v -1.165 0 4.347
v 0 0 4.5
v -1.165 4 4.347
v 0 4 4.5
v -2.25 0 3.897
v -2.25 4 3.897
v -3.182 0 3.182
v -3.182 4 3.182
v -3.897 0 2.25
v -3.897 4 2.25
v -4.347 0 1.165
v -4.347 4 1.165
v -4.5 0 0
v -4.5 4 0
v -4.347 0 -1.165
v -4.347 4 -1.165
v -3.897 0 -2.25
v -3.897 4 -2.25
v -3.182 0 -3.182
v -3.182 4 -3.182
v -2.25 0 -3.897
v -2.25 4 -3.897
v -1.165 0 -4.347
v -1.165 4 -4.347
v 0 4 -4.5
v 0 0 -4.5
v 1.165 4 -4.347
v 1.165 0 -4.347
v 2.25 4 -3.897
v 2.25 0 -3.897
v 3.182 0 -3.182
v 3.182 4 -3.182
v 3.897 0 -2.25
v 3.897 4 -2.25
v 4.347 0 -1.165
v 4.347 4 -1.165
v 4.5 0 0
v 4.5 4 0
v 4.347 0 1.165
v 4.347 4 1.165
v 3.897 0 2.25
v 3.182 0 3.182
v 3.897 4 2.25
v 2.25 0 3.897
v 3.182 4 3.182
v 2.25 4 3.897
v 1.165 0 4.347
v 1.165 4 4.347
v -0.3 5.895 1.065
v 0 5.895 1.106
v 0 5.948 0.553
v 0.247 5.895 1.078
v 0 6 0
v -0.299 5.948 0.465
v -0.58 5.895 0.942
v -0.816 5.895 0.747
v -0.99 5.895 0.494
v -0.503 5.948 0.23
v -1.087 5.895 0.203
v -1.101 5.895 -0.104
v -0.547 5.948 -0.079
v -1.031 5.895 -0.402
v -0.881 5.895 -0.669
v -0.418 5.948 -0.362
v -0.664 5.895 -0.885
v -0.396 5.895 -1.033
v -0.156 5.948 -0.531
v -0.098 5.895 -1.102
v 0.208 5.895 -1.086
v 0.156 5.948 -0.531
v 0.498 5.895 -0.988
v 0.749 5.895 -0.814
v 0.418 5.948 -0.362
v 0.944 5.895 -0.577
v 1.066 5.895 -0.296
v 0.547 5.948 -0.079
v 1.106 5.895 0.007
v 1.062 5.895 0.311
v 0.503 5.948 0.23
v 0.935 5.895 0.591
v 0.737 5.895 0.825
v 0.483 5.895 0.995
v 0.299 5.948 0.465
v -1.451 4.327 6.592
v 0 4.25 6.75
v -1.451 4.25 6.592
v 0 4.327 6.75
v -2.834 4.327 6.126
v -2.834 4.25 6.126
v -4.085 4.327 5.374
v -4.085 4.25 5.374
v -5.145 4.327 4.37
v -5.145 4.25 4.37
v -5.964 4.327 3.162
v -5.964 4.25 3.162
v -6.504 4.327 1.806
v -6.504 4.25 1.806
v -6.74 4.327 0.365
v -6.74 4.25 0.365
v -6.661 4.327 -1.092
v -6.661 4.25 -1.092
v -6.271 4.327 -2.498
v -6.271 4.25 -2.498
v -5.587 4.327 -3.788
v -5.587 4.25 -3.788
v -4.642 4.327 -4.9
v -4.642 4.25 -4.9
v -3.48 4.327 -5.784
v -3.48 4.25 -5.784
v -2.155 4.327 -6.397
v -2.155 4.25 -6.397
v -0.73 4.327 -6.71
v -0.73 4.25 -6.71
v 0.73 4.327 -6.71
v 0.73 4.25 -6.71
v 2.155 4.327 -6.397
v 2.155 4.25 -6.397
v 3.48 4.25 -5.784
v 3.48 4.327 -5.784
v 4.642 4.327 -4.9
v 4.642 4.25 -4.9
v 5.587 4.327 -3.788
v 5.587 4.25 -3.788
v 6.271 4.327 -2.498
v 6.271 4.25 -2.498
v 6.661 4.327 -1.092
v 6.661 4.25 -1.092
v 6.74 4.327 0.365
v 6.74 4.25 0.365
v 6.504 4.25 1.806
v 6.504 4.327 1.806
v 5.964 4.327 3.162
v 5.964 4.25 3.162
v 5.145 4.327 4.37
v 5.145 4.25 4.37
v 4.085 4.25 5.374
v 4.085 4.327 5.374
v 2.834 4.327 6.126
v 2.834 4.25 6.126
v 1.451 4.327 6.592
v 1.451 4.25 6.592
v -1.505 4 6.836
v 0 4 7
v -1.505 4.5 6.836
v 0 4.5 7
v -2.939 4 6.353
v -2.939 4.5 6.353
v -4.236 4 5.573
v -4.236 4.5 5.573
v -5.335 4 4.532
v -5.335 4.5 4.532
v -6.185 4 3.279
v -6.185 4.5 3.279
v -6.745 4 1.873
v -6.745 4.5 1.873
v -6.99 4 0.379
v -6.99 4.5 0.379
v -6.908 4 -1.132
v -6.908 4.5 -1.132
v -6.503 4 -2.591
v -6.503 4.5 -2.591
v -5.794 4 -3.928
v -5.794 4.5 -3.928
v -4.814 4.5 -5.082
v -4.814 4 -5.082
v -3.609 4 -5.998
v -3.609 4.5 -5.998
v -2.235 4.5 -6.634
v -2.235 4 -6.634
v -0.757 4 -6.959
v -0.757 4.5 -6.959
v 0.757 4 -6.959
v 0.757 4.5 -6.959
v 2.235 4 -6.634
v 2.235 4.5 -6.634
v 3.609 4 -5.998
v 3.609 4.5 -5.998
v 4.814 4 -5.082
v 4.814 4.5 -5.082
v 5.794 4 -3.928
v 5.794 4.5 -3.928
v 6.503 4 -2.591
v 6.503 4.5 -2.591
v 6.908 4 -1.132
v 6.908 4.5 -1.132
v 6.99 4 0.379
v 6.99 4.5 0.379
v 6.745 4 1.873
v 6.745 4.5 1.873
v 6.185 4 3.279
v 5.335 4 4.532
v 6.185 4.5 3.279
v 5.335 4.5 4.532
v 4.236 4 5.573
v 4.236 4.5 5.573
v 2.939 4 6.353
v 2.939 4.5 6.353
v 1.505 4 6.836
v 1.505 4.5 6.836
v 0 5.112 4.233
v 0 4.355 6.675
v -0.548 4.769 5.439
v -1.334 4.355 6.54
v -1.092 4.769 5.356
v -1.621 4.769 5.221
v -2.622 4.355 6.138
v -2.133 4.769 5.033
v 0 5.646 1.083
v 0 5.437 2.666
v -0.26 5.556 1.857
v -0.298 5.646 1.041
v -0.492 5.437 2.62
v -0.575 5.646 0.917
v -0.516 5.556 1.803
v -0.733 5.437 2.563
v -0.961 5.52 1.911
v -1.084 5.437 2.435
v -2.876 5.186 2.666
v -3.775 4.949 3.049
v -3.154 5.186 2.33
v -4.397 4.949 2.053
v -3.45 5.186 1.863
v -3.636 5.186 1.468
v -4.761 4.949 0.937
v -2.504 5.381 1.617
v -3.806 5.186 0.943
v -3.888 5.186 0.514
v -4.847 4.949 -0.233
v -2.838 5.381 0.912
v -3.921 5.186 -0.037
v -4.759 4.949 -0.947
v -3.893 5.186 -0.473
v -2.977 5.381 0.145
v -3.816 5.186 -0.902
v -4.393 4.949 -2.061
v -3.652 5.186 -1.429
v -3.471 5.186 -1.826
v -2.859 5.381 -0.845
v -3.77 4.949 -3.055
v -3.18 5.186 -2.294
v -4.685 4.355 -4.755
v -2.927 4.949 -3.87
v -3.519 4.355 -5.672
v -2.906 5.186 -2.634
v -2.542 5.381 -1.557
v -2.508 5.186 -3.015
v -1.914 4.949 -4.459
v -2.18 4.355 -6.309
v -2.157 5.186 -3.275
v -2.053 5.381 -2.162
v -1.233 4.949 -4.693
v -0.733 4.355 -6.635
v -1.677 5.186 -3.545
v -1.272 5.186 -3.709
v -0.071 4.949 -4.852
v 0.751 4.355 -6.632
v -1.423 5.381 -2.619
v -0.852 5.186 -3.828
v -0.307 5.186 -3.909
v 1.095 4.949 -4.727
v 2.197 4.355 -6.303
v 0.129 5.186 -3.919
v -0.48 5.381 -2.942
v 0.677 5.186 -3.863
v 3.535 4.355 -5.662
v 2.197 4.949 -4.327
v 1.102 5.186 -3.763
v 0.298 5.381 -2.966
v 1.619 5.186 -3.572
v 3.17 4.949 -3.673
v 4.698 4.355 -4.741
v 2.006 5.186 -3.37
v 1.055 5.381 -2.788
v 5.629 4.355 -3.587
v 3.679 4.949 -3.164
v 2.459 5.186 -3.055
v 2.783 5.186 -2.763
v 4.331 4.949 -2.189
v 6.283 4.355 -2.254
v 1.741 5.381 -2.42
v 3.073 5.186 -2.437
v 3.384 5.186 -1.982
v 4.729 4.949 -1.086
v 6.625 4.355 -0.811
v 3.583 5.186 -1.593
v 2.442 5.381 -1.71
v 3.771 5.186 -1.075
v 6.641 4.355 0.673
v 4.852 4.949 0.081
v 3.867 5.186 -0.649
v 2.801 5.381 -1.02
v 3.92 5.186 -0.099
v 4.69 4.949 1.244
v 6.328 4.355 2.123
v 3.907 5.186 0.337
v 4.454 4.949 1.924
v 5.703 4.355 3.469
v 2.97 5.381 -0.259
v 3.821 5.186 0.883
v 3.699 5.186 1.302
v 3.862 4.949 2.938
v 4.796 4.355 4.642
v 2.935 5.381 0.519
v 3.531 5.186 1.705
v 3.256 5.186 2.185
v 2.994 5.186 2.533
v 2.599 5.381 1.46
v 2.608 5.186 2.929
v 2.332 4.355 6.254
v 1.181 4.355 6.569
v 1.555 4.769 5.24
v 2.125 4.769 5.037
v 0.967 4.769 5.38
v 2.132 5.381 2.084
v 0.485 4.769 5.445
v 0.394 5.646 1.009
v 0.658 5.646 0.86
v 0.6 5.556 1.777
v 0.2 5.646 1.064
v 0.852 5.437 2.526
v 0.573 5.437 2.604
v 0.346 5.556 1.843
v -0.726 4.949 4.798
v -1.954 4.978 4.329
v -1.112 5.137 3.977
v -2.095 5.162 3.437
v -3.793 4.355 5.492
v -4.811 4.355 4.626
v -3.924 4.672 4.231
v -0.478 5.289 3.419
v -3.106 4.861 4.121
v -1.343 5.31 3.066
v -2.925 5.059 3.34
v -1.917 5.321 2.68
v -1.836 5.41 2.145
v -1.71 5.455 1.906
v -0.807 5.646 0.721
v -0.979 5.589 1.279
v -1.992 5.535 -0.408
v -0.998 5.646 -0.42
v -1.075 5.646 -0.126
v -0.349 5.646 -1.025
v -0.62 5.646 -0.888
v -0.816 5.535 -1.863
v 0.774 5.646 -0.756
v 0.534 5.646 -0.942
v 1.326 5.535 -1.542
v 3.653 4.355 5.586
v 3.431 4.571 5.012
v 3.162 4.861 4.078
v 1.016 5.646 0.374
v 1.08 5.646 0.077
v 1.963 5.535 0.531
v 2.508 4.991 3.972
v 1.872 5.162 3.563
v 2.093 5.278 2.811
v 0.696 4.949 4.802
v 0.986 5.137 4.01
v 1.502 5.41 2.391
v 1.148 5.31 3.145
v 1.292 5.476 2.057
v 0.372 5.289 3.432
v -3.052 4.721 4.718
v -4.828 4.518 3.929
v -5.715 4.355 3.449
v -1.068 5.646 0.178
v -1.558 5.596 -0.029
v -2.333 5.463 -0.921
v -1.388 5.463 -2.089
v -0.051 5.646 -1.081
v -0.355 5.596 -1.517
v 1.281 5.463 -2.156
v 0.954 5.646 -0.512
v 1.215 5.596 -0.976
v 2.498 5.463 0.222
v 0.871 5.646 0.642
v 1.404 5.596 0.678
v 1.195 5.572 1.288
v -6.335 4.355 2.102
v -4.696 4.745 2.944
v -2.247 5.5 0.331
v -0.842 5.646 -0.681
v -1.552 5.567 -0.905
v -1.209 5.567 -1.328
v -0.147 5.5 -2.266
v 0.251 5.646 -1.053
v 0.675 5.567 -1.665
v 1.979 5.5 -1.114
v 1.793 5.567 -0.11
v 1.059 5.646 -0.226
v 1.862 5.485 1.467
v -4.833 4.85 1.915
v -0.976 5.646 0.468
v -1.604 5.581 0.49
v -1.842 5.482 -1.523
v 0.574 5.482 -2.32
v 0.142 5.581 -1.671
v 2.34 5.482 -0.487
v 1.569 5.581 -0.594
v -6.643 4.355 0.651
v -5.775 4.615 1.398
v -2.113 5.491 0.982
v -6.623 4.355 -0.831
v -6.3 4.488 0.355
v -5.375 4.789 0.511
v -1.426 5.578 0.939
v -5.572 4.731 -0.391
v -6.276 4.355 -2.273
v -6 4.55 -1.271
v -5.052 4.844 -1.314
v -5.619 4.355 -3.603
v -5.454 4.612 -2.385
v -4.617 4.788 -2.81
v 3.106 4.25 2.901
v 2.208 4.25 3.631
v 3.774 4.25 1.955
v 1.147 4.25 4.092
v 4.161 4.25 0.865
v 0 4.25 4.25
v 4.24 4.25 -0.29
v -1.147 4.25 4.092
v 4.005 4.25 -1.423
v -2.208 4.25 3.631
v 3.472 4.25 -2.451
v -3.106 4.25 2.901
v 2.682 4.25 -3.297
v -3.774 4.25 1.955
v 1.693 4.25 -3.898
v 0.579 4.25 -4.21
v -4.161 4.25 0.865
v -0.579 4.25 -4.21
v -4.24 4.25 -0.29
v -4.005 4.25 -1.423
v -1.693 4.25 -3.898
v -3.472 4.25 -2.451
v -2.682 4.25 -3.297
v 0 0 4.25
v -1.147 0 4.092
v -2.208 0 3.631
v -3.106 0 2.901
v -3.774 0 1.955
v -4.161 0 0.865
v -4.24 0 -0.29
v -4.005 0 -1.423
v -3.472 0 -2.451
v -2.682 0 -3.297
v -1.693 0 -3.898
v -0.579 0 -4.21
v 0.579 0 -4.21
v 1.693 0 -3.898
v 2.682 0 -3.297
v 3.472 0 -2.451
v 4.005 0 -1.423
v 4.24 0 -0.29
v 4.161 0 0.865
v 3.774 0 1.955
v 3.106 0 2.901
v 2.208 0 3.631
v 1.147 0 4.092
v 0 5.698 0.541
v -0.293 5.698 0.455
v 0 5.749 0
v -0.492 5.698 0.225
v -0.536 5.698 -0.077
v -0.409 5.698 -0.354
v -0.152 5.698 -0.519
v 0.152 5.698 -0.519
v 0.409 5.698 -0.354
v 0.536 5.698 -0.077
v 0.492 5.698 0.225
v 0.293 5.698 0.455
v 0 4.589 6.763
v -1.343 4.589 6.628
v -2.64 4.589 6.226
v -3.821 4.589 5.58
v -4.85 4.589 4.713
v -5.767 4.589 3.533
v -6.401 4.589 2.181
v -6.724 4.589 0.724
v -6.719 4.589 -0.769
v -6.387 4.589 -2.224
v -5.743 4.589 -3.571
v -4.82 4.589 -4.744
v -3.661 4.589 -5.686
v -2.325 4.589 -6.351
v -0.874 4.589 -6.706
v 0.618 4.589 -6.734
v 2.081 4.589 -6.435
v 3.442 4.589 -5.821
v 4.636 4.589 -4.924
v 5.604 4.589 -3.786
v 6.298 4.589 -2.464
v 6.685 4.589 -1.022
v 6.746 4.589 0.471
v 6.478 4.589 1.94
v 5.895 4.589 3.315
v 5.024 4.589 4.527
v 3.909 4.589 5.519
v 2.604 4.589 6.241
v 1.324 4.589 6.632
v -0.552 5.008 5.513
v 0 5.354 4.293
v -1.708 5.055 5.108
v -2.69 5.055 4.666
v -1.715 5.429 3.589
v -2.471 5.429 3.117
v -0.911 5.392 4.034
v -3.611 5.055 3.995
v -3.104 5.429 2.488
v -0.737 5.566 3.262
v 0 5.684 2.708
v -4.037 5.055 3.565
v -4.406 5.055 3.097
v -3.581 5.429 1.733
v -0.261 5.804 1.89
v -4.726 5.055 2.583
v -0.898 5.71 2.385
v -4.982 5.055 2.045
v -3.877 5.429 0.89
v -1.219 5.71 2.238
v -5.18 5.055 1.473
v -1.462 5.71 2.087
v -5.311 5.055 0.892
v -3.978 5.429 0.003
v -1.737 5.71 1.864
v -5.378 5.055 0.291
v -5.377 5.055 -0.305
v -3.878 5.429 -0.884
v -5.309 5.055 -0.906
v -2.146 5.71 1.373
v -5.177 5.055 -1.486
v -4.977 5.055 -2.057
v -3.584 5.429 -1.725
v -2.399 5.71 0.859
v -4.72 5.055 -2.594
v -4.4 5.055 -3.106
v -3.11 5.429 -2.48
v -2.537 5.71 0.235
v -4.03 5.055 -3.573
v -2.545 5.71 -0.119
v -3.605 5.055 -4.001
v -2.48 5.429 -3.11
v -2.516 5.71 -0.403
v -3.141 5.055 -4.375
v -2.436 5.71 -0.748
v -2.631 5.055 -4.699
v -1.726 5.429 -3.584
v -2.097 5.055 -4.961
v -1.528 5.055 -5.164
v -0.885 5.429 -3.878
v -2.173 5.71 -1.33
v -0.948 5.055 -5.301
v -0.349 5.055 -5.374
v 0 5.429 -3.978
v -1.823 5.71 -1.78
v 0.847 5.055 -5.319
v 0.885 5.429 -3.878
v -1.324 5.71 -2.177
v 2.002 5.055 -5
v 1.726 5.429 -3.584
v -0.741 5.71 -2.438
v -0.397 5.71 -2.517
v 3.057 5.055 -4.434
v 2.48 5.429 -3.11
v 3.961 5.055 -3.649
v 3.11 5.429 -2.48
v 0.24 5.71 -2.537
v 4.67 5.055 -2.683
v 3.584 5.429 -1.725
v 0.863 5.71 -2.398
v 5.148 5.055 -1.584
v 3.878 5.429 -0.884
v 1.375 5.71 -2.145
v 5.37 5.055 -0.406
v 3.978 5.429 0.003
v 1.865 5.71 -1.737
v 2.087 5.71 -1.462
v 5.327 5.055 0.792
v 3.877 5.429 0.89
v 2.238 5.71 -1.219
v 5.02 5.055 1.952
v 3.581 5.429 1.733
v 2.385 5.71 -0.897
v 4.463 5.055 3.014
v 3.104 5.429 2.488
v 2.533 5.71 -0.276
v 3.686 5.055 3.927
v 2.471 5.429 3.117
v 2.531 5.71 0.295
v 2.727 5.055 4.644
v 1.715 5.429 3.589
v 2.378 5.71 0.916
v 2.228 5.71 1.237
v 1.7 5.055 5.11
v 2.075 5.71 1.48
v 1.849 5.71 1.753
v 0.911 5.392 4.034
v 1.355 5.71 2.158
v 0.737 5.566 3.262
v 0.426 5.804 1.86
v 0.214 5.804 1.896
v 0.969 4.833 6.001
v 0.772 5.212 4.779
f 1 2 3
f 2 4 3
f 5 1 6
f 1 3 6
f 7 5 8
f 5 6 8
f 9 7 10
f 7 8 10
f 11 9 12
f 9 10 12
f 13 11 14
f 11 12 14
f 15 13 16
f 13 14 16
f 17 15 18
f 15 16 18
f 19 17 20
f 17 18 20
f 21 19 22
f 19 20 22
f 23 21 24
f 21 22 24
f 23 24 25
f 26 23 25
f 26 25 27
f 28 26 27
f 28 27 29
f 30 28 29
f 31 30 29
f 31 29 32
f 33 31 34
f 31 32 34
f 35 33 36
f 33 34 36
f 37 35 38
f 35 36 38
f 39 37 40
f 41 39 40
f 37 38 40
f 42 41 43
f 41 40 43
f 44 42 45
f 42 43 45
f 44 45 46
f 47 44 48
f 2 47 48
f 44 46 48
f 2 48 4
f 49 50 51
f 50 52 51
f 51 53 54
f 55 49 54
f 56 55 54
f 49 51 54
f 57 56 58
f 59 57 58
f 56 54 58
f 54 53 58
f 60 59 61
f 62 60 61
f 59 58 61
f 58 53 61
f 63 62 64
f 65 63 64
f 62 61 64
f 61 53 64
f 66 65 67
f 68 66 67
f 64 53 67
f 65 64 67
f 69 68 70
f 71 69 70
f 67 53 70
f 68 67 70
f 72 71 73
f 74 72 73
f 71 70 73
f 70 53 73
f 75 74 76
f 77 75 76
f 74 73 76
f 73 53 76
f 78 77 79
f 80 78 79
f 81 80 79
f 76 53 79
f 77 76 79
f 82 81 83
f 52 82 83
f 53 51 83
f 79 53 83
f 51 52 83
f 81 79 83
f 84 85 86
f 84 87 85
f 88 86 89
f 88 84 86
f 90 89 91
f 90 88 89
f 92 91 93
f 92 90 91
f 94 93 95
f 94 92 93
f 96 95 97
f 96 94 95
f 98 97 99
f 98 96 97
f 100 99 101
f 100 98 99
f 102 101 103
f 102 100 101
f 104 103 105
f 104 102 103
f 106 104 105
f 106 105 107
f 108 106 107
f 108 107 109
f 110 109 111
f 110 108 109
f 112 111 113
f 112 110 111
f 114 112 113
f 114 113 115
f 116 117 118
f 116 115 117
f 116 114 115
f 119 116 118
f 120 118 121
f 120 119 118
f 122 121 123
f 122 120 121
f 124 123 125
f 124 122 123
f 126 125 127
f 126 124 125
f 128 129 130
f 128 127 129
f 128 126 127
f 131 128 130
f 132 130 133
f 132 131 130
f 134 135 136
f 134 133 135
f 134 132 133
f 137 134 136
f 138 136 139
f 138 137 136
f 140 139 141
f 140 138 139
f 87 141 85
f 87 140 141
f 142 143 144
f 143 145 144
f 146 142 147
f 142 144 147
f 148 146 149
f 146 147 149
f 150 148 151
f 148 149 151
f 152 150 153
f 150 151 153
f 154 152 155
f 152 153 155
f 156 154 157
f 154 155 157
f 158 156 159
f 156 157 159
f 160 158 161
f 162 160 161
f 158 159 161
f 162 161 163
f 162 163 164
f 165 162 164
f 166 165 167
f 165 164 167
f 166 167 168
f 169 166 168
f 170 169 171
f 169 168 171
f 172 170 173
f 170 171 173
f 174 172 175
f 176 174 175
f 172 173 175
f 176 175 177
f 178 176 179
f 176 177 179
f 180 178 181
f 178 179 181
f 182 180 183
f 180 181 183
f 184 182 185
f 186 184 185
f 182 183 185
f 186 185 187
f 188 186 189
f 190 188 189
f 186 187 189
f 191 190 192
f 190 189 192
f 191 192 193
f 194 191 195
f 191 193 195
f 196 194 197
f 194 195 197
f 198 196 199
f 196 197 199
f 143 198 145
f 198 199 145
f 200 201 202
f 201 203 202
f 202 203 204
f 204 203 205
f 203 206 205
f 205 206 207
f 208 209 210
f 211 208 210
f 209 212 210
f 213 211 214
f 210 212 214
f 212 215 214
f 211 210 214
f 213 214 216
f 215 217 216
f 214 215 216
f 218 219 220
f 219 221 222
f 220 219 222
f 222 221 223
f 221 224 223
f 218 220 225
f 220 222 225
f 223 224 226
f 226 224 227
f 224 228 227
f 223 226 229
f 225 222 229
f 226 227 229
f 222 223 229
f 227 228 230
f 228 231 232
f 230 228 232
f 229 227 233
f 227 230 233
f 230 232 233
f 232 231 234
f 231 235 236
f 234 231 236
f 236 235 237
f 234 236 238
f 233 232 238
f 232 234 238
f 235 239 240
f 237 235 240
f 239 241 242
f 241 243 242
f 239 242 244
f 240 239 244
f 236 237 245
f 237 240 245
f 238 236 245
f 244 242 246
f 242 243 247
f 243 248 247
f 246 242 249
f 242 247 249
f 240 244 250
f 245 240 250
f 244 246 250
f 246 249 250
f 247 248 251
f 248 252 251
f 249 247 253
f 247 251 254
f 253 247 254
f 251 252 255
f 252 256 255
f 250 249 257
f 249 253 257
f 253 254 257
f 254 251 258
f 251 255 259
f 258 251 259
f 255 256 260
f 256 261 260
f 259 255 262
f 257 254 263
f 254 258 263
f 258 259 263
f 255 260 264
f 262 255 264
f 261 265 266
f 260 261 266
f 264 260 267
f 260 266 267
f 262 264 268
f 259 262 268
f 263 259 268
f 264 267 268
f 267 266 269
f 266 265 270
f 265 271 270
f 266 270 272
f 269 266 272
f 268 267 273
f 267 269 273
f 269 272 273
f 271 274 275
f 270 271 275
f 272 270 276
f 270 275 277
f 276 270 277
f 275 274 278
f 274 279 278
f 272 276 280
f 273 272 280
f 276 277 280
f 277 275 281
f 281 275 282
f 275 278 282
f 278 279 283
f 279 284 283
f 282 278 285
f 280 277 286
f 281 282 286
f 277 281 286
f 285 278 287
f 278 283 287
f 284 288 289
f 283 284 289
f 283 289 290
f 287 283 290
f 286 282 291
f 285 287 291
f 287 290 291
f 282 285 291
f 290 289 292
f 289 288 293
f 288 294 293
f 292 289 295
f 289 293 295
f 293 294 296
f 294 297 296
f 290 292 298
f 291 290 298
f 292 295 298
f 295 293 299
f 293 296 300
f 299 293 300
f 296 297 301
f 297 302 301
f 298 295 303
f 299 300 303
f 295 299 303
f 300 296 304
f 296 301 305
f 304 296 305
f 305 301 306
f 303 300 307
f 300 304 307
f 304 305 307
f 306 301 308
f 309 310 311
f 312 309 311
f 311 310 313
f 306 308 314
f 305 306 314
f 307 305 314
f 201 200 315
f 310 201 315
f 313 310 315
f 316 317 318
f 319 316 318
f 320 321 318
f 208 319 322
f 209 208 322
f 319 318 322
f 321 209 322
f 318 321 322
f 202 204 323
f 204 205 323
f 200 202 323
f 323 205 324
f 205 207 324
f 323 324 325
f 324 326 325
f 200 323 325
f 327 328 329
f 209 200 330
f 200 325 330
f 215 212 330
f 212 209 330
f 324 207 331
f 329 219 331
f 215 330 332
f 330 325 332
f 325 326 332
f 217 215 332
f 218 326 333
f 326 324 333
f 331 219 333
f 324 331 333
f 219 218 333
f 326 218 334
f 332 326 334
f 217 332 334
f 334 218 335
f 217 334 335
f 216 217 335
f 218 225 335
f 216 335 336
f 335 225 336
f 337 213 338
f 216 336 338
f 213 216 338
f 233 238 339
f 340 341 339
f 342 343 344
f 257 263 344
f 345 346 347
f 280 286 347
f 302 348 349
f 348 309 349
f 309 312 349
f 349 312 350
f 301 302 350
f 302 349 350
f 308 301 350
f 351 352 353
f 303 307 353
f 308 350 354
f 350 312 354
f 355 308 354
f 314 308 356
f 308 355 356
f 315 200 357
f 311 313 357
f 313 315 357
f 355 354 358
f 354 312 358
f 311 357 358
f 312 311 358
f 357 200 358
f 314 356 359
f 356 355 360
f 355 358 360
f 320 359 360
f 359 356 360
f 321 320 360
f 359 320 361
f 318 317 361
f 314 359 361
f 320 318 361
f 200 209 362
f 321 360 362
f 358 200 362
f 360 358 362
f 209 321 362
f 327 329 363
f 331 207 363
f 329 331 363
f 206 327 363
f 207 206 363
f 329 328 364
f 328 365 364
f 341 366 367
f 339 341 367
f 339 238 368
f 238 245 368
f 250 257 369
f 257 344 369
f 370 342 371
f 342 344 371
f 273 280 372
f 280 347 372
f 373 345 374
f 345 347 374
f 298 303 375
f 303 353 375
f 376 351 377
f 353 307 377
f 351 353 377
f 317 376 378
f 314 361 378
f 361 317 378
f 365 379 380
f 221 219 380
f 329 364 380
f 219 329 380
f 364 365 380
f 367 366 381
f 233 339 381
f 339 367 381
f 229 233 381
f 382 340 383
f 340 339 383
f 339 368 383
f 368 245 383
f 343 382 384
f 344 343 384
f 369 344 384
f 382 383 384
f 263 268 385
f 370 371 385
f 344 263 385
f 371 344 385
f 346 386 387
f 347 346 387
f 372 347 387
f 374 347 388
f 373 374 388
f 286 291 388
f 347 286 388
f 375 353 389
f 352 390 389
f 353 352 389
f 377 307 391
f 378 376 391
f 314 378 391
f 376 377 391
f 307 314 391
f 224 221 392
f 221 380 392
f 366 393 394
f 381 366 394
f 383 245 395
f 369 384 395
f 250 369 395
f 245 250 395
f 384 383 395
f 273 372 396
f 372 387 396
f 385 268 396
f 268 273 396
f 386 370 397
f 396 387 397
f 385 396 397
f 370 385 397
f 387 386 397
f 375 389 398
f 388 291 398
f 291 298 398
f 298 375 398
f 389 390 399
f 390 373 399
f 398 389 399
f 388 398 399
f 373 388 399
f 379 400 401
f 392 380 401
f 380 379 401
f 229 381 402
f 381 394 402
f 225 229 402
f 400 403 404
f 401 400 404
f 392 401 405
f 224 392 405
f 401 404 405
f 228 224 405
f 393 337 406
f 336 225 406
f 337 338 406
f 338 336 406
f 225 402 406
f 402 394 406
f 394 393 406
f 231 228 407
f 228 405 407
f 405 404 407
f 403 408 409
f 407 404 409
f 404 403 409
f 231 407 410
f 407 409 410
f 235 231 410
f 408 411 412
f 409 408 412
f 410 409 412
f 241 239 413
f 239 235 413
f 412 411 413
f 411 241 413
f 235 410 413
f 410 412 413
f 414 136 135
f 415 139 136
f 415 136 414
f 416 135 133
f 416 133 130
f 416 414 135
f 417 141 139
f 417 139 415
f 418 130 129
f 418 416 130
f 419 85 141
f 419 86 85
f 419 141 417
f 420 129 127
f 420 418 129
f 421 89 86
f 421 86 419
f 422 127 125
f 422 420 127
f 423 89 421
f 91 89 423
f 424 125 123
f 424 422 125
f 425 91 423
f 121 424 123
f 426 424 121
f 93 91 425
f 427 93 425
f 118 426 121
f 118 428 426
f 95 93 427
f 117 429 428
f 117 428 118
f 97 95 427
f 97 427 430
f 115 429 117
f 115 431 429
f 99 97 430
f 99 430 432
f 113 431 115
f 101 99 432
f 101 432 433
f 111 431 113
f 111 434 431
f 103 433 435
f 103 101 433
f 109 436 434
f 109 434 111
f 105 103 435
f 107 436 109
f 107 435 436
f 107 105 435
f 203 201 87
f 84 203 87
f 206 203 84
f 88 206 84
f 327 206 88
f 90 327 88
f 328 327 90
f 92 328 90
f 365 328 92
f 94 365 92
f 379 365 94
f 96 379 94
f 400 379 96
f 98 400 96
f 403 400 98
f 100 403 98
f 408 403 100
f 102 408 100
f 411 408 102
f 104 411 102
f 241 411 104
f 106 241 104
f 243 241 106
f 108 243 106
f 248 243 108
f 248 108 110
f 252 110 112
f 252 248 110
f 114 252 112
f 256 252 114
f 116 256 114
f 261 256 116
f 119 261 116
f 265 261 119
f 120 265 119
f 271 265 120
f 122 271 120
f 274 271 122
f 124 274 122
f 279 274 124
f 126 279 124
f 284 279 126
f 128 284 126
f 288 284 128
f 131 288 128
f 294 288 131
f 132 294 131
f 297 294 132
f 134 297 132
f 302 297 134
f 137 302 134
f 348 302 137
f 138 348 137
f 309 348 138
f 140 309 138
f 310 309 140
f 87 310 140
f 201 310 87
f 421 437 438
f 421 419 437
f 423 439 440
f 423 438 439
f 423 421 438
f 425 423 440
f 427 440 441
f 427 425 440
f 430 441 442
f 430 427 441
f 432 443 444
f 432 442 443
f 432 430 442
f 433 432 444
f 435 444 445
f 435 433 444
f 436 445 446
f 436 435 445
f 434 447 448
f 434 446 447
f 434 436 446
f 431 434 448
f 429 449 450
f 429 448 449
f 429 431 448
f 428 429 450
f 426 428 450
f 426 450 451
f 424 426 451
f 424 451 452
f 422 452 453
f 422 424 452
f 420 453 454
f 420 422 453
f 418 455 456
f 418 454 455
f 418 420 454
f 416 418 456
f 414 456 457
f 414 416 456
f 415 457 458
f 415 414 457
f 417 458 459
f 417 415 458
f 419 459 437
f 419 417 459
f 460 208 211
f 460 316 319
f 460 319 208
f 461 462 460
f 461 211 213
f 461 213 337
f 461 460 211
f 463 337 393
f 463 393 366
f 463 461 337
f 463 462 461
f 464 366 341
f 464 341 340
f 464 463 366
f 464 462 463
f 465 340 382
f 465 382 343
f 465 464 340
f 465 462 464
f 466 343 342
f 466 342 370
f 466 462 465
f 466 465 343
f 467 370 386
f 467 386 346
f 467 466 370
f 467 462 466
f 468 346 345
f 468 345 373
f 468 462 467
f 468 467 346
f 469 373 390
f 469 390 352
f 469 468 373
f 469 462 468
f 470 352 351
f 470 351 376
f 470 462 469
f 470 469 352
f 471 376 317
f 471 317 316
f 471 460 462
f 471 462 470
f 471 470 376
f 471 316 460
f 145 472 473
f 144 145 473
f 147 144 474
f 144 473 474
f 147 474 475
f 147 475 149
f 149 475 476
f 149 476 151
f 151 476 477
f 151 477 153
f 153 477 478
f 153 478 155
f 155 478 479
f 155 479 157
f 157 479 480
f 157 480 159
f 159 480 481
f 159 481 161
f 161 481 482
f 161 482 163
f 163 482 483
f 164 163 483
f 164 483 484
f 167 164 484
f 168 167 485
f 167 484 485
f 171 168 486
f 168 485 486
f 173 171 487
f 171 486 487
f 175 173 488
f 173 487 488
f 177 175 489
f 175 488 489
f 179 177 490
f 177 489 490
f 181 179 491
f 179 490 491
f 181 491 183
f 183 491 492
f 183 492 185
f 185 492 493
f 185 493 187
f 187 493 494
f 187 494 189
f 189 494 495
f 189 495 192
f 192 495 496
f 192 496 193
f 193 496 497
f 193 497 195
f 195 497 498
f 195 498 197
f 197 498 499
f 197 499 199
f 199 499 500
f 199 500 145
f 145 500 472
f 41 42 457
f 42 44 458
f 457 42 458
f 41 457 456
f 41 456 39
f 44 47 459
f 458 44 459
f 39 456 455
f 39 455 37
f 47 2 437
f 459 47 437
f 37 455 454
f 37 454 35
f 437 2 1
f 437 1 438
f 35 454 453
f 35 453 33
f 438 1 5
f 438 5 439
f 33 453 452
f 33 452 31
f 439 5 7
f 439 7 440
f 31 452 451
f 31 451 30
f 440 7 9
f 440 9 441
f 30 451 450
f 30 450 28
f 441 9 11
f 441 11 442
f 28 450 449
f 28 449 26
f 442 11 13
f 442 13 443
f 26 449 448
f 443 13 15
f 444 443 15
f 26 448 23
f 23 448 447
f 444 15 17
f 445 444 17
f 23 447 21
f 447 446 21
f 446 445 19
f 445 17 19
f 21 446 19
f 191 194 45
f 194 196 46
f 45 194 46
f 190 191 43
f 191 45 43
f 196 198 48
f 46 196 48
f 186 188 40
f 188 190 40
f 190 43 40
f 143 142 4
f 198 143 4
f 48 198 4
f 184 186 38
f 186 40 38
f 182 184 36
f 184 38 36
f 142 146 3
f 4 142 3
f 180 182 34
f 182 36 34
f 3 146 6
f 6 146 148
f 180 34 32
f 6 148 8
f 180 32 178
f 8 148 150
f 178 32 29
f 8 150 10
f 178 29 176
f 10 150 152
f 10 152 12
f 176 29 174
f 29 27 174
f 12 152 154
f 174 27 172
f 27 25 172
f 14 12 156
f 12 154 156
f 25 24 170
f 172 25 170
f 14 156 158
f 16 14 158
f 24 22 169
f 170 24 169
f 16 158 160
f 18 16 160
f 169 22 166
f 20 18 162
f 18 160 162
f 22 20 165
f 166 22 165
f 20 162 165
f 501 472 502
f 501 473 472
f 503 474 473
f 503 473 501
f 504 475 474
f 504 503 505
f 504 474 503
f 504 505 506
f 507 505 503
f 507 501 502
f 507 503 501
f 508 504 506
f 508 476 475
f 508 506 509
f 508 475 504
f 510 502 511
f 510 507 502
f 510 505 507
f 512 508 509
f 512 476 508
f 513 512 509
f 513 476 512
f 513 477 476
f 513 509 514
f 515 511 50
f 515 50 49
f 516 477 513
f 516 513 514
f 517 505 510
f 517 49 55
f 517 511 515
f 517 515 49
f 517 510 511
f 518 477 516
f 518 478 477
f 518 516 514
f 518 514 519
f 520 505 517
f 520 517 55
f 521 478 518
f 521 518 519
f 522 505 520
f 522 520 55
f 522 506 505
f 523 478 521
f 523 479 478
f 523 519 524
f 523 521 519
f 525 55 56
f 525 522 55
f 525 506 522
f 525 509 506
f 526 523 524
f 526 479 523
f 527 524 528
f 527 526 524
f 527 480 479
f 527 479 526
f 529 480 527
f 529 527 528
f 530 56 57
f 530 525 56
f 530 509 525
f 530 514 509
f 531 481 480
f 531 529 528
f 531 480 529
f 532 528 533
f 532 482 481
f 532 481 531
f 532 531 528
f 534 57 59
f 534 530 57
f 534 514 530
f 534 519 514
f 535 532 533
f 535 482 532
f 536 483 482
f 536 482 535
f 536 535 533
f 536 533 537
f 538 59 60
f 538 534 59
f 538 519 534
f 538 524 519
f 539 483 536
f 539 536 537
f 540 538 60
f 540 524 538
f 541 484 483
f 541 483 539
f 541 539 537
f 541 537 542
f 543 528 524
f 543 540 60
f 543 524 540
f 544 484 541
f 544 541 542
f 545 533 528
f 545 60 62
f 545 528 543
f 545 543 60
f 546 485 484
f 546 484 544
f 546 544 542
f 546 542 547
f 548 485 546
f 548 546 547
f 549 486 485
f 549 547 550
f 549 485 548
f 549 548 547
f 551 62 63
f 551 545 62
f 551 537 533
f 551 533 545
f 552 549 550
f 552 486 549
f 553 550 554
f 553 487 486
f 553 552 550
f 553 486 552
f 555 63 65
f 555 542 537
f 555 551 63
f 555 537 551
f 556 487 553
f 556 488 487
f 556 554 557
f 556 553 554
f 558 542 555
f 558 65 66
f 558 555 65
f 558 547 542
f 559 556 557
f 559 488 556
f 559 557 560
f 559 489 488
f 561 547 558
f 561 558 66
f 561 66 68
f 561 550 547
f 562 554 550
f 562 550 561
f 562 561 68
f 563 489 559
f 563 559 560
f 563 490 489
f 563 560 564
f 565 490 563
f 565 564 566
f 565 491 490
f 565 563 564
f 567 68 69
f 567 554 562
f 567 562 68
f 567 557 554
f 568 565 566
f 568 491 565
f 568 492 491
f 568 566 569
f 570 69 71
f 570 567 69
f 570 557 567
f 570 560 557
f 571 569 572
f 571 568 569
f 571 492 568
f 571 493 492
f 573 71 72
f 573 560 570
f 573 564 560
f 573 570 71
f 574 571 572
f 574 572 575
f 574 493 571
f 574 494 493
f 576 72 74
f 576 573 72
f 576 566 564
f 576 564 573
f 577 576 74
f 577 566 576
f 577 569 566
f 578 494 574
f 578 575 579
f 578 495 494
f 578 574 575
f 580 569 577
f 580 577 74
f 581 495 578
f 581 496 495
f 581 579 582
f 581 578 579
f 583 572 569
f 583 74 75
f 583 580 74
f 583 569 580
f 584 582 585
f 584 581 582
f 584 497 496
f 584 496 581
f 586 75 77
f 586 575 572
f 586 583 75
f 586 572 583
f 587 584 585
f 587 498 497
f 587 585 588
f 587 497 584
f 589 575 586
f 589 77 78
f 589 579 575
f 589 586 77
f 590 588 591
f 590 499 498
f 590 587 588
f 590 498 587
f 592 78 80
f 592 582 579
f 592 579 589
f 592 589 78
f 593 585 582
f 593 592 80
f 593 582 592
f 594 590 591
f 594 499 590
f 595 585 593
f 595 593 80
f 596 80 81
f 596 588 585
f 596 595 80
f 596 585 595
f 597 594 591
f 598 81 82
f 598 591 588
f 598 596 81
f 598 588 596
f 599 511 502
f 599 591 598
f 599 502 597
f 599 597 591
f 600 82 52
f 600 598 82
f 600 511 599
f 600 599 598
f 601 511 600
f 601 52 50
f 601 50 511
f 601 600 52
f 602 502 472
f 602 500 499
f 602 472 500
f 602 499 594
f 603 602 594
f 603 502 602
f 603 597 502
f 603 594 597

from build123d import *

# Parameters (mm, degrees)
FILLET1_R = 22
SHELL1_T  = -0.25


with BuildPart() as part:
    # Sketch1 → Revolve3 (revolve)
    with BuildSketch(Plane.XY, mode=Mode.PRIVATE) as revolve3_sk:
        Polygon((0, 0), (4.5, 0), (4.5, 4), (7, 4), (7, 4.5), (4.021373221, 5.618538642), (0, 6), align=None)
    revolve(revolve3_sk.sketch.rotate(Axis((0, 6, 0), (0, -1, 0)), 90), axis=Axis((0, 6, 0), (0, -1, 0)))

    # Fillet1
    fillet1_edges = [part.edges().sort_by_distance(p)[0] for p in [
        (0, 5.618538642, -4.021373221),
    ]]
    fillet(fillet1_edges, radius=FILLET1_R)

    # Shell1
    shell1_openings = [part.faces().sort_by_distance(p)[0] for p in [
        (0, 0, 0),
    ]]
    offset(amount=SHELL1_T, openings=shell1_openings, kind=Kind.INTERSECTION)


solid = part.part
